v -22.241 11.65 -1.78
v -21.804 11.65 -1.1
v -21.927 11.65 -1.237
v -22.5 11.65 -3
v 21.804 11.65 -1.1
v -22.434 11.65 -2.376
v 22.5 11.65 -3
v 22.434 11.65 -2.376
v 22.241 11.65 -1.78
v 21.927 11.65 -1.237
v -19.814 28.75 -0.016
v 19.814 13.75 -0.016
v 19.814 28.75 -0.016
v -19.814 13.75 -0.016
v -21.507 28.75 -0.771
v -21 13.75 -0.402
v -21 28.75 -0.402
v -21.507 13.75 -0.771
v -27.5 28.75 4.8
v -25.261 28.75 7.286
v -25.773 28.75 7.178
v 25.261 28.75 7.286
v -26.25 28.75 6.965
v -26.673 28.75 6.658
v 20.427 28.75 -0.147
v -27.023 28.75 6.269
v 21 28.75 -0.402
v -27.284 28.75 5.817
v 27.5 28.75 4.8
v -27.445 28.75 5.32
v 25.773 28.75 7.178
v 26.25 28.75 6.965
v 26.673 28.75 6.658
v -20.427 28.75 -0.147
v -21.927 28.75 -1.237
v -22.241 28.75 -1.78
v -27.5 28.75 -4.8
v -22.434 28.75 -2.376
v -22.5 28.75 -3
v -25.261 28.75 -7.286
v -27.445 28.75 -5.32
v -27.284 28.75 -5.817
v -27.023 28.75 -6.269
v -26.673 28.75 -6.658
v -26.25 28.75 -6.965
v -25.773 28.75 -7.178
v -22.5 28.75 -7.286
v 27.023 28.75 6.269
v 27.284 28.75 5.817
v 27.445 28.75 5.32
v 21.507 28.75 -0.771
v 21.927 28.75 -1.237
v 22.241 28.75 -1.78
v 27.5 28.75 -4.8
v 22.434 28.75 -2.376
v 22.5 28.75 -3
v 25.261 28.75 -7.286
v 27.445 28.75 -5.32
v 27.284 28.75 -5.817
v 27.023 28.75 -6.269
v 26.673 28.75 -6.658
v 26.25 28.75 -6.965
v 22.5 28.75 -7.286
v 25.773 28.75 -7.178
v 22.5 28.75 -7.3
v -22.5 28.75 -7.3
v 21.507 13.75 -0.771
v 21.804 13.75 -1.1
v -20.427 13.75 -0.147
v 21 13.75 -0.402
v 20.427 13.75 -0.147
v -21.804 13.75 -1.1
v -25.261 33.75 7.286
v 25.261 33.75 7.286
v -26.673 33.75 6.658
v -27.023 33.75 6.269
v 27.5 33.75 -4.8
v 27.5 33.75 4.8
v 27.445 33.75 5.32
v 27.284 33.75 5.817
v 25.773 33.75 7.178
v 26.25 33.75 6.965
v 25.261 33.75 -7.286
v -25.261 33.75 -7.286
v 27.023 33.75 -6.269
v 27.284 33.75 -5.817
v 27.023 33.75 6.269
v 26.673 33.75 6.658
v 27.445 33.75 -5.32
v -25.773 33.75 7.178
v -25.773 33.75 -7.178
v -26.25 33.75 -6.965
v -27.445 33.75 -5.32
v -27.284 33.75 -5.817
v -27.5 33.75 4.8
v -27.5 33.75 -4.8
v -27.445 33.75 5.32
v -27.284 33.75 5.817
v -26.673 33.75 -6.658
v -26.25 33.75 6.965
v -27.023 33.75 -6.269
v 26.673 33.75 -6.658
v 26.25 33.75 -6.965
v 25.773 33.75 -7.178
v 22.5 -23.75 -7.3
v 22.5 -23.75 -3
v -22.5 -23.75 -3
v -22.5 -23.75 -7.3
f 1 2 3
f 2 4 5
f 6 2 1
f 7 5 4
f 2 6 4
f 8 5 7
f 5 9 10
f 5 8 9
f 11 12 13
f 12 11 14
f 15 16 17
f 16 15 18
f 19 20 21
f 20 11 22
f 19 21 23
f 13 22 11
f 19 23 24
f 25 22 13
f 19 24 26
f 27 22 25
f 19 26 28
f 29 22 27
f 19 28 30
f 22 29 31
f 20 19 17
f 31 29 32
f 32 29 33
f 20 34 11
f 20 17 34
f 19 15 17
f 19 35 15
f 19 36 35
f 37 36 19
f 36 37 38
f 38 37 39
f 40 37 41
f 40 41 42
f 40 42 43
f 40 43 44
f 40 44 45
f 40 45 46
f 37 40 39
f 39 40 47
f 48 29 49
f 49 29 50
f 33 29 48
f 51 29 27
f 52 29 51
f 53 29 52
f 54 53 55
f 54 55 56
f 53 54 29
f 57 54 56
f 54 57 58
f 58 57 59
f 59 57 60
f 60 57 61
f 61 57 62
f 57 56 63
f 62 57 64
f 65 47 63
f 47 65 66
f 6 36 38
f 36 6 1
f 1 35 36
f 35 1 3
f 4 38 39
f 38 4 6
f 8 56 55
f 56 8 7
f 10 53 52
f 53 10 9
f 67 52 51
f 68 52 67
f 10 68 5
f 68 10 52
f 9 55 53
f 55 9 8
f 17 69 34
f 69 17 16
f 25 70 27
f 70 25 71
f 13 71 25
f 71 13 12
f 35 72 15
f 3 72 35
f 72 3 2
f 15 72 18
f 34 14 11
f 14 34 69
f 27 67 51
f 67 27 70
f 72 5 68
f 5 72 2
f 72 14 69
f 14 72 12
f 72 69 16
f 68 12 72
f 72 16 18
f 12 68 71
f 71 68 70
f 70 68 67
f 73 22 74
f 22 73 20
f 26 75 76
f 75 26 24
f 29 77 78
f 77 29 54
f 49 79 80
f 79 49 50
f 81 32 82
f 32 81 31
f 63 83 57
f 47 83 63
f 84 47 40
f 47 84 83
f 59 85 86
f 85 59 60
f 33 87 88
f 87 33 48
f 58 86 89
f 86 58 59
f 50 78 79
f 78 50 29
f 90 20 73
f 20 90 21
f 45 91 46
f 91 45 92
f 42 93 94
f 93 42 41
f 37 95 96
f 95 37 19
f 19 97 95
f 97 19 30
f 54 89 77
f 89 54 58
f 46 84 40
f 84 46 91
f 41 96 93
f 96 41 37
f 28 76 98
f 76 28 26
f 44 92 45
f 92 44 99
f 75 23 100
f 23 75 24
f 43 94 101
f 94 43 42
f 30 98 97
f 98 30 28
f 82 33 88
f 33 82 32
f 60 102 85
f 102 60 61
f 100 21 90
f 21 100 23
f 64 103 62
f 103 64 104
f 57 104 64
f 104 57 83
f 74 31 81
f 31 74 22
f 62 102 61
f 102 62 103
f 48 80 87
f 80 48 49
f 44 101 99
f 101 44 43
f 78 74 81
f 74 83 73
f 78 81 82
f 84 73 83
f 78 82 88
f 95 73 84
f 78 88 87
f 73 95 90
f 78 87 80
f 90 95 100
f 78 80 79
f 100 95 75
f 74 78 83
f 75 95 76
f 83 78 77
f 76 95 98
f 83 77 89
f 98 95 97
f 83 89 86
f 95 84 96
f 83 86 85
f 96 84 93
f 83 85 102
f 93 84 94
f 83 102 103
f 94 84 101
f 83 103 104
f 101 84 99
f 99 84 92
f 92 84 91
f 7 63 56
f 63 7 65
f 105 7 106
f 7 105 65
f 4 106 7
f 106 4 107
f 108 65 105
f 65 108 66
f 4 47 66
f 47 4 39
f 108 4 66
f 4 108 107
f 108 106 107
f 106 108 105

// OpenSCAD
// View the tool base, cover, or both.
part = "cover"; // [base:Base Only,cover:Cover Only,assembly:Full Assembly,both:Base and Cover]

print_part();

/* [CPU Dimensions] */

// Total width of the CPU's PCB.
cpu_width = 45;
// Total depth of the CPU's PCB.
cpu_depth = 42.5;
// Total height of the entire CPU (including the IHS).
cpu_height = 4.6;

// Total height of just the PCB.
pcb_height = 1.6;
// Height of the lip (thin base) of the IHS.
lip_height = 1.1;
// Depth of the lip (thin base) on the IHS.
lip_depth = 2.1;
// Cutout width for the middle of some new lake-generation processors.
lip_cutout = 0;

/* [Box Margins] */

// Margin on the X sides of the tool.
width_margin = 5; // [2:1:10]
box_width = cpu_width + width_margin * 2;
// Margin on the Y sides of the tool.
depth_margin = 5; // [2:1:10]
box_depth = cpu_depth + depth_margin * 3;
// Margin on the top and bottom of the tool.
height_margin = 5; // [2:1:10]
box_height = cpu_height + height_margin * 2;
// Clearance for the components on the bottom of the CPU.
bottom_clearance = 2; // [1:0.2:3]
// Margin to the sides of the components on the bottom of the CPU.
bottom_margin = 10; //[2:1:10]

/* [Hidden] */

// Resolution quality of the curves and fillets.
$fn = 30;

cover_height = cpu_height - pcb_height;
fillet_radius = (height_margin + depth_margin) / 4;

// Make a cube with four rounded sides.
module roundcube(xyz, r, center=false) {
    translate(center ? -[xyz[0] / 2, xyz[1] / 2, xyz[2] / 2] : []) hull() {
        translate([r,          r,          0]) cylinder(h=xyz[2], r=r);
        translate([r,          xyz[1] - r, 0]) cylinder(h=xyz[2], r=r);
        translate([xyz[0] - r, r,          0]) cylinder(h=xyz[2], r=r);
        translate([xyz[0] - r, xyz[1] - r, 0]) cylinder(h=xyz[2], r=r);
    }
}

// Total geometry of the tool base.
module print_base() {
    difference() {
        // The main cube to cut from.
        rotate([90]) roundcube([box_width, box_height, box_depth], fillet_radius, center=true);

        // Large section on top, half cube.
        translate([0, depth_margin / 2 + 0.5, box_height / 4 + 0.5])
            cube([cpu_width, cpu_depth + depth_margin * 2 + 1, box_height / 2 + 1], center=true);

        // PCB cutout.
        translate([0, depth_margin / 2, -pcb_height / 2 + 0.5])
            cube([cpu_width, cpu_depth, pcb_height + 1], center=true);

        // Bottom components clearance.
        translate([0, depth_margin / 2, -pcb_height / 2 - bottom_clearance / 2 + 0.5])
            cube([cpu_width - bottom_margin * 2, cpu_depth - bottom_margin * 2, bottom_clearance + 1], center=true);
    }
}

// Total geometry of the tool cover.
module print_cover() {
    // translate([0, -depth_margin])
    union() {
        // Round cube for the front part.
        translate([0, box_depth / 2 + depth_margin / 2]) rotate([90])
            roundcube([box_width, box_height, depth_margin], fillet_radius, center=true);

        difference() {
            // Filleted cube for the part pressuring the IHS.
            translate([0, box_depth / 2 - depth_margin * 1.5 - lip_depth / 2, -cover_height]) hull() {
                translate([ cpu_width / 2 - cover_height, 0, 0]) rotate([90])
                    cylinder(r=cover_height, h=depth_margin * 3 + lip_depth, center=true);
                translate([-cpu_width / 2 + cover_height, 0, 0]) rotate([90])
                    cylinder(r=cover_height, h=depth_margin * 3 + lip_depth, center=true);
            }

            // Cutout for the IHS lip.
            translate([0, -lip_depth / 2 + box_depth / 2 - depth_margin * 3 - 0.5, -lip_height / 2 + 0.5])
                cube([cpu_width, lip_depth + 1, lip_height + 1], center=true);

            // Cutout in the middle for some newer processors.
            translate([0, -lip_depth / 2 + box_depth / 2 - depth_margin * 3 - 0.5, -cover_height / 2 + 0.5])
                cube([lip_cutout, lip_depth + 1, cover_height + 1], center=true);
        }

        // Main top part of the cover.
        translate([0, depth_margin / 2, -box_height / 4 - cover_height / 2])
            cube([cpu_width, box_depth - depth_margin, box_height / 2 - cover_height], center=true);
    }
}

// Select the part to calculate by the part variable.
module print_part() {
    if (part == "base") { // View tool base.
        print_base();
    } else if (part == "cover") { // View tool cover.
        print_cover();
    } else if (part == "assembly") { // View tool assembly.
        color([1, 1, 0, 0.5]) translate([0, -depth_margin / 2]) print_base();
        color([0, 1, 1, 0.5]) translate([0,  depth_margin / 2]) rotate([0, 180]) print_cover();
    } else { // View tool spread out, printable form. Includes both option.
        translate([-box_width / 2 - 5, 0 / 2, 0]) print_base();
        translate([ box_width / 2 + 5, 0,     0]) print_cover();
    }
}
